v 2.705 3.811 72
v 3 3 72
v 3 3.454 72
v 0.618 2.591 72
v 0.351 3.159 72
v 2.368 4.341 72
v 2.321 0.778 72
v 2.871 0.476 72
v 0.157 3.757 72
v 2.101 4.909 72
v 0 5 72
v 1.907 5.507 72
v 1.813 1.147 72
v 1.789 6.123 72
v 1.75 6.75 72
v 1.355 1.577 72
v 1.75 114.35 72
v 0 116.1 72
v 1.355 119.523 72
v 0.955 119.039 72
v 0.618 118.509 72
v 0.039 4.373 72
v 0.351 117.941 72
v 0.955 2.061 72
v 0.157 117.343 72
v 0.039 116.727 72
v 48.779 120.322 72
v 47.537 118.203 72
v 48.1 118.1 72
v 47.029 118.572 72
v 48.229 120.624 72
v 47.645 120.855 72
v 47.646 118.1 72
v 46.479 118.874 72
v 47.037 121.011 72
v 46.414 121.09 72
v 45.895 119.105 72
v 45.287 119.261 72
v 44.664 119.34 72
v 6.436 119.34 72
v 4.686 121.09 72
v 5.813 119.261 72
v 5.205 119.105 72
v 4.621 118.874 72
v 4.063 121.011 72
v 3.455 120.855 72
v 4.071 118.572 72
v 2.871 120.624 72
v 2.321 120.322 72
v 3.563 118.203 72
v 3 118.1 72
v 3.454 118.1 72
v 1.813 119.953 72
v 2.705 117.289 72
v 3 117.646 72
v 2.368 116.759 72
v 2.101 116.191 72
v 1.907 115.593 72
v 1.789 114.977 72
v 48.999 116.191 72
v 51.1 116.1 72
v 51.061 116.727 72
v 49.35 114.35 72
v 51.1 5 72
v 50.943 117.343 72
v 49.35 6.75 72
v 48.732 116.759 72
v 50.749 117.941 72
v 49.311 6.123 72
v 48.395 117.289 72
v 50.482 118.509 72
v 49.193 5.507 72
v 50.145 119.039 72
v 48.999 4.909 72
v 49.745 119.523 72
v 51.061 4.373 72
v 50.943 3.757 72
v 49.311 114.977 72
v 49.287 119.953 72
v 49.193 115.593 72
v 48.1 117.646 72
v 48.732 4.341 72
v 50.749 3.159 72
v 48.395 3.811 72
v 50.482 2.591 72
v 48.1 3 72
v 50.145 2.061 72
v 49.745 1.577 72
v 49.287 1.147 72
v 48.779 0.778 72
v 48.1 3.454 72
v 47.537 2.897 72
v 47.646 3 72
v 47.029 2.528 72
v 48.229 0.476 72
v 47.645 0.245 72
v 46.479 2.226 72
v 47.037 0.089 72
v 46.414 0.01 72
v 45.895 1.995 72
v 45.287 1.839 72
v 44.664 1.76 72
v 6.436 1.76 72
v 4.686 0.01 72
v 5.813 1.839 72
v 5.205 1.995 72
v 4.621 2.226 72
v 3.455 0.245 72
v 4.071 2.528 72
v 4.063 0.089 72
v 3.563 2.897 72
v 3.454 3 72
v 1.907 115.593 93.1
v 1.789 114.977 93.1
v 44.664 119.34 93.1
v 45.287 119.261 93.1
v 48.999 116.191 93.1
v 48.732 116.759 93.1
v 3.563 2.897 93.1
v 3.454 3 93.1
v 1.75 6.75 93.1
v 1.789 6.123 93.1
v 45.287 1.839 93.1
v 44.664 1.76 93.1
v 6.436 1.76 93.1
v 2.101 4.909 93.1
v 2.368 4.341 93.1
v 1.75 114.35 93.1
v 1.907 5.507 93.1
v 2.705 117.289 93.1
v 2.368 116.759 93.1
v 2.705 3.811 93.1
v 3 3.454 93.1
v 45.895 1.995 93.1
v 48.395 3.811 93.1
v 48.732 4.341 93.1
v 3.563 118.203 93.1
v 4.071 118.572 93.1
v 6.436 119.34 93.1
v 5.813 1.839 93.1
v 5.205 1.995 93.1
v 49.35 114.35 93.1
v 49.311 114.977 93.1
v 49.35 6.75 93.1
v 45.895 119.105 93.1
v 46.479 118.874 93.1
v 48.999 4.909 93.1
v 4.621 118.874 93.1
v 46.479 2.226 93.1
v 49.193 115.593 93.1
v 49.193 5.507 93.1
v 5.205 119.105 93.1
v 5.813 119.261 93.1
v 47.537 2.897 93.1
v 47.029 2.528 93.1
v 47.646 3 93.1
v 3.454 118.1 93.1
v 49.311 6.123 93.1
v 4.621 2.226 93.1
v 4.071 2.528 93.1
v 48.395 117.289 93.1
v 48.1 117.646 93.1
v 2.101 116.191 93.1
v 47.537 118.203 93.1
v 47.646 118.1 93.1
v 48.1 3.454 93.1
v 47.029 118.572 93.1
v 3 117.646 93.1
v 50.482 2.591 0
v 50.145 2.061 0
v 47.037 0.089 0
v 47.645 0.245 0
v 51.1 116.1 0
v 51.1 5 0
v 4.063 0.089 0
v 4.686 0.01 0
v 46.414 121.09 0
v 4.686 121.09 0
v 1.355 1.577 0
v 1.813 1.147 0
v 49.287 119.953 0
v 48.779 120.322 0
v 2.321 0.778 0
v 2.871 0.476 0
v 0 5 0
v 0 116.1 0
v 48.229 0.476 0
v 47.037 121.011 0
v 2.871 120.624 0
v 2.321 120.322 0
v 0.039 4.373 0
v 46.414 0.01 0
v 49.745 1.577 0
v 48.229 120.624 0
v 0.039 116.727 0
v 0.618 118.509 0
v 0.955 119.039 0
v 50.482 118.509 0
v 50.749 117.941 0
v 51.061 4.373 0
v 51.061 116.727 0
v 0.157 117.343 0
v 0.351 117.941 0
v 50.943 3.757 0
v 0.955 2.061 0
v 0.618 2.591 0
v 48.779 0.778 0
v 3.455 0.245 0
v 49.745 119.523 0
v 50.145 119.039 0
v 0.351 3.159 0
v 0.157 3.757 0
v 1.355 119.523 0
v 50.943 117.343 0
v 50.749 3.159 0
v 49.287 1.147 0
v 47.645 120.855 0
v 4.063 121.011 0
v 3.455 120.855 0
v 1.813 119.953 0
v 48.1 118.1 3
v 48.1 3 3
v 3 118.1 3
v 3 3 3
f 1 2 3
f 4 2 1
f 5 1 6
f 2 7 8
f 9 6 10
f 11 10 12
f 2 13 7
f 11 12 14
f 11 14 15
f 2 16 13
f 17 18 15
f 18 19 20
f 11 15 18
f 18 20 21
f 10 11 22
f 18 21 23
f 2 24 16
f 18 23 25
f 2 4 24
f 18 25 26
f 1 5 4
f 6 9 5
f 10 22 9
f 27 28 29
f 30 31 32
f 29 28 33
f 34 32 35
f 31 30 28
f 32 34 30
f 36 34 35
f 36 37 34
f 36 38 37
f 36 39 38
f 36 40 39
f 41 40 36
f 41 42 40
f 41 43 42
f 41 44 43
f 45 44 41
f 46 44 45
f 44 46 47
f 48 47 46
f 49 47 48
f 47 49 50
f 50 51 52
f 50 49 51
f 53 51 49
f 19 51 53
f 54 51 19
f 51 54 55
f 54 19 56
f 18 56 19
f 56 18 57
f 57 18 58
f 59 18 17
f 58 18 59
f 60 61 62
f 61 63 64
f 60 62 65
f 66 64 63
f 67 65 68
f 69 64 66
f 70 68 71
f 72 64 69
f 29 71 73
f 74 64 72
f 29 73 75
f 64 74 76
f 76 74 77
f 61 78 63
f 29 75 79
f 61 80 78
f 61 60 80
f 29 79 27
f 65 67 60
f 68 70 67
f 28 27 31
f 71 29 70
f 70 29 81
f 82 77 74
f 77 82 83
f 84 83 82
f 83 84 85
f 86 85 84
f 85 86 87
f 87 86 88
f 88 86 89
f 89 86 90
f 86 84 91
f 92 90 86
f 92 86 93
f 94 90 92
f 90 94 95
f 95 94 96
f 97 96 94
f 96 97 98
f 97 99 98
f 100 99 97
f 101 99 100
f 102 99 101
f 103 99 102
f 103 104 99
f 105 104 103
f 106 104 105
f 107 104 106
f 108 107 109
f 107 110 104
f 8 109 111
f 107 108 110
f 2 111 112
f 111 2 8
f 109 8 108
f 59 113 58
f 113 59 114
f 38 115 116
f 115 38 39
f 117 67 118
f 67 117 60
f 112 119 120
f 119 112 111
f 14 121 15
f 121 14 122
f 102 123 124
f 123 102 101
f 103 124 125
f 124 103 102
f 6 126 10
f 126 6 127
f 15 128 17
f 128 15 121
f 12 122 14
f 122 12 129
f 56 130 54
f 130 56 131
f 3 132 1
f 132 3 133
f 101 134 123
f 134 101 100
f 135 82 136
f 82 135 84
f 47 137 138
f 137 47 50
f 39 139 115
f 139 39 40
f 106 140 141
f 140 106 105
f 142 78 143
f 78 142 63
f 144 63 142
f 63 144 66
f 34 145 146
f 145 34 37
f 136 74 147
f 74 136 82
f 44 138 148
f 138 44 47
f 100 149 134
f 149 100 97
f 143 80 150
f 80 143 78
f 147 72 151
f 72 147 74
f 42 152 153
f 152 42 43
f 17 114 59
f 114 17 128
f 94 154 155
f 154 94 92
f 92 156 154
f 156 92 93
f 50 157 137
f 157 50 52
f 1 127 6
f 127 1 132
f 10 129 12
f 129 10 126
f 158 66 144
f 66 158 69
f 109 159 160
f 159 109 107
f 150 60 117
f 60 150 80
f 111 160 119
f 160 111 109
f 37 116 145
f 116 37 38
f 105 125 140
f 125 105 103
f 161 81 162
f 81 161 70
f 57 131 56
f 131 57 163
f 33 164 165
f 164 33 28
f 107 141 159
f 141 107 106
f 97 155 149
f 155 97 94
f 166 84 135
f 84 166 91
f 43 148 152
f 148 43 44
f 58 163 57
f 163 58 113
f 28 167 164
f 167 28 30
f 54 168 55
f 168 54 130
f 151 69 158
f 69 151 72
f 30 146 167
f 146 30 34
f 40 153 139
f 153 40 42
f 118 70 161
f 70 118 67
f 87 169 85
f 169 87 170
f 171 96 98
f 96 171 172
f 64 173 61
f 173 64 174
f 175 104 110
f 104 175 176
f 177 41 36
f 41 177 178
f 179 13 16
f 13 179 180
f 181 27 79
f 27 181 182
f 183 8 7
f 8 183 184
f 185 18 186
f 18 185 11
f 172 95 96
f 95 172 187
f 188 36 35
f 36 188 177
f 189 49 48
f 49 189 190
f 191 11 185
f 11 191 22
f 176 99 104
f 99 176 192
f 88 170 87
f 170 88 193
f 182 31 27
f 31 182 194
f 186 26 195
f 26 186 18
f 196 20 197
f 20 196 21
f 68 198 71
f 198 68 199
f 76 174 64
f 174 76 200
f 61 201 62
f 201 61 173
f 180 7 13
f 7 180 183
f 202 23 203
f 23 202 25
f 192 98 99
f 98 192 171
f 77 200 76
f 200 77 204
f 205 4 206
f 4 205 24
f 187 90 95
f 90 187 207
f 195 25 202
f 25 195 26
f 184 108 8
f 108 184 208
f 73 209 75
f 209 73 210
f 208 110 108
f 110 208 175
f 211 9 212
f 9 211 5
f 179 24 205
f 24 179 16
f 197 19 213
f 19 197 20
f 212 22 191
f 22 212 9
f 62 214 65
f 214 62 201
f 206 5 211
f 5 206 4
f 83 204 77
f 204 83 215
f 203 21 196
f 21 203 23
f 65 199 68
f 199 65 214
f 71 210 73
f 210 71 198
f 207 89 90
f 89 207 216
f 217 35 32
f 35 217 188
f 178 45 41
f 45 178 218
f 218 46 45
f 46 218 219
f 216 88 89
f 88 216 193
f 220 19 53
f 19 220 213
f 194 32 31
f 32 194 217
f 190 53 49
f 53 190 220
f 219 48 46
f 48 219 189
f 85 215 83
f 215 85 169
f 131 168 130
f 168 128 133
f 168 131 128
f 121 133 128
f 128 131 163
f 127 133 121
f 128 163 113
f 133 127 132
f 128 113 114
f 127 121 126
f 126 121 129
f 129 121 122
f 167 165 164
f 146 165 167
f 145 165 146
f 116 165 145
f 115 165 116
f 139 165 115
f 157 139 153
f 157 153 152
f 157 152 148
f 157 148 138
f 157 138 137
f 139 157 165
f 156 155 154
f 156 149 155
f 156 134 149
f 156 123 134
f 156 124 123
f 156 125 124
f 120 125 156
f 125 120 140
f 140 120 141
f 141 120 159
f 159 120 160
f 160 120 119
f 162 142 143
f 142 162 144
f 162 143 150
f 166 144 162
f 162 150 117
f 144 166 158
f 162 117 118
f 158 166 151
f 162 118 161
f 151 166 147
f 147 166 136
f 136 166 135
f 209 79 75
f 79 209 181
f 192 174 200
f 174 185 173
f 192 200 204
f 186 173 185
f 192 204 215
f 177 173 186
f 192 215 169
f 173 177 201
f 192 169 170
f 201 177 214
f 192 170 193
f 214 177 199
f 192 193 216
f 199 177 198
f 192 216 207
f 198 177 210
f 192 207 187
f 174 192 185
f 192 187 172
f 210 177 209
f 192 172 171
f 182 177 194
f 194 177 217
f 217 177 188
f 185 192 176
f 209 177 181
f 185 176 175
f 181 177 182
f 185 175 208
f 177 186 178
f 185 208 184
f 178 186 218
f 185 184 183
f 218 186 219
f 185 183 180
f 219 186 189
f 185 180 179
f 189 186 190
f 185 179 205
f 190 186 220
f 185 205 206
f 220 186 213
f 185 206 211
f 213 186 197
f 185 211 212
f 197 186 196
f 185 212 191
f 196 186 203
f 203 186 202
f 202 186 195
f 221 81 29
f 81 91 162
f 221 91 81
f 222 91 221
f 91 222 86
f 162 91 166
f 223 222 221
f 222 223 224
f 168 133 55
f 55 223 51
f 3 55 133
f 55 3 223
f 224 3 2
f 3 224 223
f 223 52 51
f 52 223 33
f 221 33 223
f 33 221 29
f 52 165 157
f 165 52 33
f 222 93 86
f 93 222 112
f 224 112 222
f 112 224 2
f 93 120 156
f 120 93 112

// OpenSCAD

/* [Configurations] */
Object_Height = 90;
Object_Width = 45;
Object_Depth = 115;
Wall_Thickness = 3;// 5mm is good enough
Cover_Height = 25;

/* [hidden] */
$fn = 50;
Tolerance = 0.1;
Cover_Spacing = 0.5;
Rounded_Corner = 5;


caixa();


module caixa(){
    difference(){
    roundedcube(Object_Width + Tolerance + (Wall_Thickness * 2), Object_Depth + Tolerance + (Wall_Thickness * 2), Object_Height + Tolerance + Wall_Thickness, Rounded_Corner,Rounded_Corner,Rounded_Corner,Rounded_Corner);
    translate([Wall_Thickness, Wall_Thickness, Wall_Thickness]) cube([Object_Width + Tolerance, Object_Depth + Tolerance, Object_Height + Tolerance + 1]);
    // Recorte da tampa
    translate([0,-0,(Object_Height + 1) - Cover_Height + (Wall_Thickness * 2)]) tampa(Cover_Spacing);    
    }
    
}

module simbolo(rotation){
    union()
	{
		rotate([90,0,rotation]) resize([larguraLogo,alturaLogo,profundidadeLogo]) import("logo.stl");
	}
}

module tampa(folga){
    difference(){
    translate([-folga/2,-folga/2,0]) roundedcube(Object_Width + Tolerance + (Wall_Thickness * 2) + folga, Object_Depth + Tolerance + (Wall_Thickness * 2) + folga, Cover_Height, Rounded_Corner,Rounded_Corner,Rounded_Corner,Rounded_Corner);
    translate([(Wall_Thickness + folga)/2, (Wall_Thickness + folga) /2, -Wall_Thickness]) roundedcube(Object_Width + Tolerance + Wall_Thickness - folga, Object_Depth + Tolerance +Wall_Thickness - folga, Cover_Height , Rounded_Corner, Rounded_Corner, Rounded_Corner, Rounded_Corner);
    }
}

module cartas(){
#cube([Object_Width, Object_Depth, Object_Height]);
}

module roundedcube(xdim ,ydim ,zdim,rdim1, rdim2, rdim3, rdim4){
    hull(){
        translate([rdim1,rdim1,0]) cylinder(r=rdim1, h=zdim);
        translate([xdim-rdim2,rdim2,0]) cylinder(r=rdim2, h=zdim);

        translate([rdim3,ydim-rdim3,0]) cylinder(r=rdim3, h=zdim);
        translate([xdim-rdim4,ydim-rdim4,0]) cylinder(r=rdim4, h=zdim);
    }
}

